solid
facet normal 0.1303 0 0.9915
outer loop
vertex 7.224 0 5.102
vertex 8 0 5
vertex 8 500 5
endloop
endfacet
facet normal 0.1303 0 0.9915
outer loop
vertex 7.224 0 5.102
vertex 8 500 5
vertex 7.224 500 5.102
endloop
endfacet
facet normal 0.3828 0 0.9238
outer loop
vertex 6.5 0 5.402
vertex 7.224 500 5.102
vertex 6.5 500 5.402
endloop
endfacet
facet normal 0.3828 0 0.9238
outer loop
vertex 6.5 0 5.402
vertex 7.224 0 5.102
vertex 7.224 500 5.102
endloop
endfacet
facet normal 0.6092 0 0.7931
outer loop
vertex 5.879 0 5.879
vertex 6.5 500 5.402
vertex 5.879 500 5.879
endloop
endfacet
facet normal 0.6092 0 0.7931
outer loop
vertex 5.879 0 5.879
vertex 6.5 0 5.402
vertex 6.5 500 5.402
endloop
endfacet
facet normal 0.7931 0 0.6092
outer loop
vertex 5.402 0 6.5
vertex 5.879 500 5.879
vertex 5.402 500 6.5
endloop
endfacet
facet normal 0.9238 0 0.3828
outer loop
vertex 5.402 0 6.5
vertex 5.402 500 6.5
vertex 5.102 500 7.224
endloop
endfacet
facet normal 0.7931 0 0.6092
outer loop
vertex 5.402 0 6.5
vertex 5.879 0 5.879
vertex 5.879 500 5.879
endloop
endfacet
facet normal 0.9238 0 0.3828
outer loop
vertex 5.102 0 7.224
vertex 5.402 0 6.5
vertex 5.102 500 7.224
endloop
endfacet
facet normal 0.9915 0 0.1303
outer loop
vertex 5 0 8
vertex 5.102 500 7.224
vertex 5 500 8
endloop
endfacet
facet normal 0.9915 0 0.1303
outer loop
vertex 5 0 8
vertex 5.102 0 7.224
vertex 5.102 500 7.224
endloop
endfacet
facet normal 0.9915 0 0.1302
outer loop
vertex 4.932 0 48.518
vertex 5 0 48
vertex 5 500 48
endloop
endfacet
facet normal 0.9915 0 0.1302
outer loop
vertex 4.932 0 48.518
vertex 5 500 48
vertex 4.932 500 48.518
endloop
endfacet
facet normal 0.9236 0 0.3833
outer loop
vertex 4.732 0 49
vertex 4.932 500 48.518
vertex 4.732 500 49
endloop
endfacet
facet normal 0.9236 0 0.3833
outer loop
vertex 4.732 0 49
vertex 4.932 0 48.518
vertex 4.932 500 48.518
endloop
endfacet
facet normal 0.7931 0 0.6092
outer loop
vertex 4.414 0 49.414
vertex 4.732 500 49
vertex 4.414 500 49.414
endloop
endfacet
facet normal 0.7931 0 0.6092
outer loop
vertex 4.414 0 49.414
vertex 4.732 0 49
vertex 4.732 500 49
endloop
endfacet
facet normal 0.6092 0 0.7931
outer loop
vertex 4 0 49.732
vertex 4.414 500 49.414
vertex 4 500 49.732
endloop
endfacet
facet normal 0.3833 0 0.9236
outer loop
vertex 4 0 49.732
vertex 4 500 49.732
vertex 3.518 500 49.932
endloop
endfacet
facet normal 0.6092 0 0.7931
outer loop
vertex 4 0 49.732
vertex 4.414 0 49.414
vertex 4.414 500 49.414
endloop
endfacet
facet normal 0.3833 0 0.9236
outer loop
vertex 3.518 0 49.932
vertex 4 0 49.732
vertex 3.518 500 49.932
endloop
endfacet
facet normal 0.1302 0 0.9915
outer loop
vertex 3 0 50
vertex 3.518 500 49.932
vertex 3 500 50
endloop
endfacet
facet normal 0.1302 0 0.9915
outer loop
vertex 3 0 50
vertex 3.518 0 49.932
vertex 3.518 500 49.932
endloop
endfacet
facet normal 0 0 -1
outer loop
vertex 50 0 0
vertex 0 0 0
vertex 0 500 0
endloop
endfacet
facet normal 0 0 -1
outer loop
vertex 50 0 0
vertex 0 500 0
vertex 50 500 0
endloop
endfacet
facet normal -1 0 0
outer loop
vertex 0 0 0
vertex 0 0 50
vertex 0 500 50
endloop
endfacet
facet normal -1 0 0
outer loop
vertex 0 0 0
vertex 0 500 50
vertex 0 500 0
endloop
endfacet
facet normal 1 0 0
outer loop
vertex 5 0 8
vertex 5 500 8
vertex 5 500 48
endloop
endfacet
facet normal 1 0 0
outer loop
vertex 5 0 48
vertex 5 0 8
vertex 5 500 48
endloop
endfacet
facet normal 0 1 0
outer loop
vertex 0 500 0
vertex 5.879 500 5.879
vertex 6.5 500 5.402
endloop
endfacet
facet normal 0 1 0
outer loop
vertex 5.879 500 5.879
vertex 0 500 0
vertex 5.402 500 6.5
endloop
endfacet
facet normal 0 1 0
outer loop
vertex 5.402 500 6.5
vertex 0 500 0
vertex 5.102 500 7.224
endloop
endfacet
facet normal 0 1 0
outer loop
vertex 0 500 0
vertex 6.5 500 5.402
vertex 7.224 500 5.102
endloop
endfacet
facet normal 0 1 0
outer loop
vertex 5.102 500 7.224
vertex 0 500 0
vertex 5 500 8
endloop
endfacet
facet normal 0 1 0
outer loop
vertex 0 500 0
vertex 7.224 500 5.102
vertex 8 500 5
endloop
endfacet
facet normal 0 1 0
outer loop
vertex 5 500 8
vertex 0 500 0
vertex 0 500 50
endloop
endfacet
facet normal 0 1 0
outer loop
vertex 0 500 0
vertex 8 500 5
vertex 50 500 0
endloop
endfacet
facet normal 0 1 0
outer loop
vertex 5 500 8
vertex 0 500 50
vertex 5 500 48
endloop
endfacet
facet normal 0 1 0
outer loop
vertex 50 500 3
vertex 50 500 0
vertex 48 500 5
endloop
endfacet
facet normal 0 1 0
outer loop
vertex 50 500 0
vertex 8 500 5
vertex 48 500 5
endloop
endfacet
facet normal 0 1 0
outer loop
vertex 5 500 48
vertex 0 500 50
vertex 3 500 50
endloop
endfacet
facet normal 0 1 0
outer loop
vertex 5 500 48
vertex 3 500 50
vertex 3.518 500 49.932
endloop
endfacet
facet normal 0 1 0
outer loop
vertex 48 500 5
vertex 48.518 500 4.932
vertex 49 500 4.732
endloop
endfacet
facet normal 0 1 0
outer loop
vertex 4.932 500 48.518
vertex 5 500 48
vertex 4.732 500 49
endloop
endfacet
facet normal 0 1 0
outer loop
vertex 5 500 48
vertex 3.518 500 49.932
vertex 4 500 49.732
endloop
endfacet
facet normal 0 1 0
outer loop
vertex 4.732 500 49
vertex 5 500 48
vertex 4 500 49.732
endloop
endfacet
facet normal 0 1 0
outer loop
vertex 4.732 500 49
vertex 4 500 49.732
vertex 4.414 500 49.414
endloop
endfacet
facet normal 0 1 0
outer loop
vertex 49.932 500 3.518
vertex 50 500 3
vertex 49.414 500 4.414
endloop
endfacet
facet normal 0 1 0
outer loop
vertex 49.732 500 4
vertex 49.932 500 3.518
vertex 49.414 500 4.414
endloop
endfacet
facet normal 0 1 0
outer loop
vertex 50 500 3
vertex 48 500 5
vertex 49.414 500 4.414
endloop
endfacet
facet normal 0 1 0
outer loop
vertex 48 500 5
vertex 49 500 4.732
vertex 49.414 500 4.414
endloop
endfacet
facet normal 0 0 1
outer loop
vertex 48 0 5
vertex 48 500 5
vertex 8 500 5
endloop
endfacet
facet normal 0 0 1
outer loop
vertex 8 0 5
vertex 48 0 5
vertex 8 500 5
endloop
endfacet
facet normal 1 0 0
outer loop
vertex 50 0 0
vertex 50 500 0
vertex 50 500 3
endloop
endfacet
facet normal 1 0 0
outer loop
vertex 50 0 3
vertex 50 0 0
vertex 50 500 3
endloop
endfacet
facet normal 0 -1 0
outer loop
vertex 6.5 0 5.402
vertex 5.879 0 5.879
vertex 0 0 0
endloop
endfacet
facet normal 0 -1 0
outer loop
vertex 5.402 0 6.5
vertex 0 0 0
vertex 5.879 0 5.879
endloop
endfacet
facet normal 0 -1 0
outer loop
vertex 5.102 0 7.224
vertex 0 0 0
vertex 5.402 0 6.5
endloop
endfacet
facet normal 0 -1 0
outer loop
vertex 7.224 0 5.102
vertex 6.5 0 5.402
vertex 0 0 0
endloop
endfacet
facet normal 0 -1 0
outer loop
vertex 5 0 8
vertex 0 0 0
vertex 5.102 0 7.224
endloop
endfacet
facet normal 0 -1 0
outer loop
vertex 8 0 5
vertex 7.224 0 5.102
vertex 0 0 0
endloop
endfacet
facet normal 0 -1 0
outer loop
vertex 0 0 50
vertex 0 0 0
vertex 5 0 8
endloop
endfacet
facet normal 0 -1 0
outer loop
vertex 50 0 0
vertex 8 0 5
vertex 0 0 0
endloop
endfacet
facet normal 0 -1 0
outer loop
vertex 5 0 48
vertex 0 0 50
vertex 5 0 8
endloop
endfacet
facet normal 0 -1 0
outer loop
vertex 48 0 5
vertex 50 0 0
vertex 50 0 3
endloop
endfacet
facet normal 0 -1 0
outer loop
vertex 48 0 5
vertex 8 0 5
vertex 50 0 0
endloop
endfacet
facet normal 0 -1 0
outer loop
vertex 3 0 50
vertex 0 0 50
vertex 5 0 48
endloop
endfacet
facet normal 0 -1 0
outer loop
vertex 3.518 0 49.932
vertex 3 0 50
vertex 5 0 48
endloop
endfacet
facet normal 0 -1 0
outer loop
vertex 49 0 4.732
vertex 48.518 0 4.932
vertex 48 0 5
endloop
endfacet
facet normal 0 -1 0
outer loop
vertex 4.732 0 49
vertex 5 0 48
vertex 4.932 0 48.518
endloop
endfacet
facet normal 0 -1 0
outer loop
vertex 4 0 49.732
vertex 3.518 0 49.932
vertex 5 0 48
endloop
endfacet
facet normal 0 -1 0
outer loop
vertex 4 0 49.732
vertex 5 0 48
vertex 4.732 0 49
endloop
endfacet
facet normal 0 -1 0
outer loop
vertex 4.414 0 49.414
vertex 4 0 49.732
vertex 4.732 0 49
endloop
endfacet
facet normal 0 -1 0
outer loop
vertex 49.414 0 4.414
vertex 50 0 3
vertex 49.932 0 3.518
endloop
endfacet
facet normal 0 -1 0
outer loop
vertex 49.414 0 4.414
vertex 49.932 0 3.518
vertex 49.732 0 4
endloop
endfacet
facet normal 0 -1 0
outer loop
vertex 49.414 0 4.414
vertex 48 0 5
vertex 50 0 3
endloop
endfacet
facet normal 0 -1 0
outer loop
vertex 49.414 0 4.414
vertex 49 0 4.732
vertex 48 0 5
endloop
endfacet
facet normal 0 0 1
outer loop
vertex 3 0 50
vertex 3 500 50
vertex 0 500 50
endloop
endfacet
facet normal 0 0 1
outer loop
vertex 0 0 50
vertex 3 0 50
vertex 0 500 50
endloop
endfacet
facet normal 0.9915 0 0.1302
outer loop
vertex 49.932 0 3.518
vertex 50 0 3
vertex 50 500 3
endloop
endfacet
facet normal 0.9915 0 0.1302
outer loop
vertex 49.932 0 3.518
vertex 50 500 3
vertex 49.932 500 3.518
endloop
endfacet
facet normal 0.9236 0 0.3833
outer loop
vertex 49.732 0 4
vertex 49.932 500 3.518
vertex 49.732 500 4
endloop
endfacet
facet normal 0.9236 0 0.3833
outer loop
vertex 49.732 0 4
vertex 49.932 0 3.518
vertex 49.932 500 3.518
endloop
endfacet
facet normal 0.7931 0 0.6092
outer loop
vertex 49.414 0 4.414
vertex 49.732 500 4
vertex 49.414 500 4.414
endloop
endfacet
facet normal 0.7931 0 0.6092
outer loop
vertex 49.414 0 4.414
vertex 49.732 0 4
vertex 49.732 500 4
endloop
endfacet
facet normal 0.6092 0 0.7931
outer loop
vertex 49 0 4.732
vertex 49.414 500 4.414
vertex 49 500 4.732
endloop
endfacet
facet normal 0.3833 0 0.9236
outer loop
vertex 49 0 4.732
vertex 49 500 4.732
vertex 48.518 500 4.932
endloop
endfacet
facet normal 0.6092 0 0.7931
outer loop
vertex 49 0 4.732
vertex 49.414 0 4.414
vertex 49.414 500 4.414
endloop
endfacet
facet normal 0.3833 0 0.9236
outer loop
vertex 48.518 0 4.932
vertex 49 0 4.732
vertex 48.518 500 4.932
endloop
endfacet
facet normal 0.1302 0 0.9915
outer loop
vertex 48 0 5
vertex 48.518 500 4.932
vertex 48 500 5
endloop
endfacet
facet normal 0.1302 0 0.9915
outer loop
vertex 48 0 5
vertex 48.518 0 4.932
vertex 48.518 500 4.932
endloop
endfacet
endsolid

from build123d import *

# Parameters (mm, degrees)
F2_DEPTH = 500


with BuildPart() as f2:
    # F0 (on Front) → F2 (new body)
    with BuildSketch(Plane.XZ):
        with BuildLine():
            Line((0, 50), (0, 0))
            Line((0, 0), (50, 0))
            Line((50, 0), (50, 3))
            ThreePointArc((50, 3), (49.4142135624, 4.4142135624), (48, 5))
            Line((48, 5), (8, 5))
            ThreePointArc((8, 5), (5.8786796564, 5.8786796564), (5, 8))
            Line((5, 8), (5, 48))
            ThreePointArc((5, 48), (4.4142135624, 49.4142135624), (3, 50))
            Line((3, 50), (0, 50))
        make_face()
    extrude(amount=-F2_DEPTH)


solid = f2.part
